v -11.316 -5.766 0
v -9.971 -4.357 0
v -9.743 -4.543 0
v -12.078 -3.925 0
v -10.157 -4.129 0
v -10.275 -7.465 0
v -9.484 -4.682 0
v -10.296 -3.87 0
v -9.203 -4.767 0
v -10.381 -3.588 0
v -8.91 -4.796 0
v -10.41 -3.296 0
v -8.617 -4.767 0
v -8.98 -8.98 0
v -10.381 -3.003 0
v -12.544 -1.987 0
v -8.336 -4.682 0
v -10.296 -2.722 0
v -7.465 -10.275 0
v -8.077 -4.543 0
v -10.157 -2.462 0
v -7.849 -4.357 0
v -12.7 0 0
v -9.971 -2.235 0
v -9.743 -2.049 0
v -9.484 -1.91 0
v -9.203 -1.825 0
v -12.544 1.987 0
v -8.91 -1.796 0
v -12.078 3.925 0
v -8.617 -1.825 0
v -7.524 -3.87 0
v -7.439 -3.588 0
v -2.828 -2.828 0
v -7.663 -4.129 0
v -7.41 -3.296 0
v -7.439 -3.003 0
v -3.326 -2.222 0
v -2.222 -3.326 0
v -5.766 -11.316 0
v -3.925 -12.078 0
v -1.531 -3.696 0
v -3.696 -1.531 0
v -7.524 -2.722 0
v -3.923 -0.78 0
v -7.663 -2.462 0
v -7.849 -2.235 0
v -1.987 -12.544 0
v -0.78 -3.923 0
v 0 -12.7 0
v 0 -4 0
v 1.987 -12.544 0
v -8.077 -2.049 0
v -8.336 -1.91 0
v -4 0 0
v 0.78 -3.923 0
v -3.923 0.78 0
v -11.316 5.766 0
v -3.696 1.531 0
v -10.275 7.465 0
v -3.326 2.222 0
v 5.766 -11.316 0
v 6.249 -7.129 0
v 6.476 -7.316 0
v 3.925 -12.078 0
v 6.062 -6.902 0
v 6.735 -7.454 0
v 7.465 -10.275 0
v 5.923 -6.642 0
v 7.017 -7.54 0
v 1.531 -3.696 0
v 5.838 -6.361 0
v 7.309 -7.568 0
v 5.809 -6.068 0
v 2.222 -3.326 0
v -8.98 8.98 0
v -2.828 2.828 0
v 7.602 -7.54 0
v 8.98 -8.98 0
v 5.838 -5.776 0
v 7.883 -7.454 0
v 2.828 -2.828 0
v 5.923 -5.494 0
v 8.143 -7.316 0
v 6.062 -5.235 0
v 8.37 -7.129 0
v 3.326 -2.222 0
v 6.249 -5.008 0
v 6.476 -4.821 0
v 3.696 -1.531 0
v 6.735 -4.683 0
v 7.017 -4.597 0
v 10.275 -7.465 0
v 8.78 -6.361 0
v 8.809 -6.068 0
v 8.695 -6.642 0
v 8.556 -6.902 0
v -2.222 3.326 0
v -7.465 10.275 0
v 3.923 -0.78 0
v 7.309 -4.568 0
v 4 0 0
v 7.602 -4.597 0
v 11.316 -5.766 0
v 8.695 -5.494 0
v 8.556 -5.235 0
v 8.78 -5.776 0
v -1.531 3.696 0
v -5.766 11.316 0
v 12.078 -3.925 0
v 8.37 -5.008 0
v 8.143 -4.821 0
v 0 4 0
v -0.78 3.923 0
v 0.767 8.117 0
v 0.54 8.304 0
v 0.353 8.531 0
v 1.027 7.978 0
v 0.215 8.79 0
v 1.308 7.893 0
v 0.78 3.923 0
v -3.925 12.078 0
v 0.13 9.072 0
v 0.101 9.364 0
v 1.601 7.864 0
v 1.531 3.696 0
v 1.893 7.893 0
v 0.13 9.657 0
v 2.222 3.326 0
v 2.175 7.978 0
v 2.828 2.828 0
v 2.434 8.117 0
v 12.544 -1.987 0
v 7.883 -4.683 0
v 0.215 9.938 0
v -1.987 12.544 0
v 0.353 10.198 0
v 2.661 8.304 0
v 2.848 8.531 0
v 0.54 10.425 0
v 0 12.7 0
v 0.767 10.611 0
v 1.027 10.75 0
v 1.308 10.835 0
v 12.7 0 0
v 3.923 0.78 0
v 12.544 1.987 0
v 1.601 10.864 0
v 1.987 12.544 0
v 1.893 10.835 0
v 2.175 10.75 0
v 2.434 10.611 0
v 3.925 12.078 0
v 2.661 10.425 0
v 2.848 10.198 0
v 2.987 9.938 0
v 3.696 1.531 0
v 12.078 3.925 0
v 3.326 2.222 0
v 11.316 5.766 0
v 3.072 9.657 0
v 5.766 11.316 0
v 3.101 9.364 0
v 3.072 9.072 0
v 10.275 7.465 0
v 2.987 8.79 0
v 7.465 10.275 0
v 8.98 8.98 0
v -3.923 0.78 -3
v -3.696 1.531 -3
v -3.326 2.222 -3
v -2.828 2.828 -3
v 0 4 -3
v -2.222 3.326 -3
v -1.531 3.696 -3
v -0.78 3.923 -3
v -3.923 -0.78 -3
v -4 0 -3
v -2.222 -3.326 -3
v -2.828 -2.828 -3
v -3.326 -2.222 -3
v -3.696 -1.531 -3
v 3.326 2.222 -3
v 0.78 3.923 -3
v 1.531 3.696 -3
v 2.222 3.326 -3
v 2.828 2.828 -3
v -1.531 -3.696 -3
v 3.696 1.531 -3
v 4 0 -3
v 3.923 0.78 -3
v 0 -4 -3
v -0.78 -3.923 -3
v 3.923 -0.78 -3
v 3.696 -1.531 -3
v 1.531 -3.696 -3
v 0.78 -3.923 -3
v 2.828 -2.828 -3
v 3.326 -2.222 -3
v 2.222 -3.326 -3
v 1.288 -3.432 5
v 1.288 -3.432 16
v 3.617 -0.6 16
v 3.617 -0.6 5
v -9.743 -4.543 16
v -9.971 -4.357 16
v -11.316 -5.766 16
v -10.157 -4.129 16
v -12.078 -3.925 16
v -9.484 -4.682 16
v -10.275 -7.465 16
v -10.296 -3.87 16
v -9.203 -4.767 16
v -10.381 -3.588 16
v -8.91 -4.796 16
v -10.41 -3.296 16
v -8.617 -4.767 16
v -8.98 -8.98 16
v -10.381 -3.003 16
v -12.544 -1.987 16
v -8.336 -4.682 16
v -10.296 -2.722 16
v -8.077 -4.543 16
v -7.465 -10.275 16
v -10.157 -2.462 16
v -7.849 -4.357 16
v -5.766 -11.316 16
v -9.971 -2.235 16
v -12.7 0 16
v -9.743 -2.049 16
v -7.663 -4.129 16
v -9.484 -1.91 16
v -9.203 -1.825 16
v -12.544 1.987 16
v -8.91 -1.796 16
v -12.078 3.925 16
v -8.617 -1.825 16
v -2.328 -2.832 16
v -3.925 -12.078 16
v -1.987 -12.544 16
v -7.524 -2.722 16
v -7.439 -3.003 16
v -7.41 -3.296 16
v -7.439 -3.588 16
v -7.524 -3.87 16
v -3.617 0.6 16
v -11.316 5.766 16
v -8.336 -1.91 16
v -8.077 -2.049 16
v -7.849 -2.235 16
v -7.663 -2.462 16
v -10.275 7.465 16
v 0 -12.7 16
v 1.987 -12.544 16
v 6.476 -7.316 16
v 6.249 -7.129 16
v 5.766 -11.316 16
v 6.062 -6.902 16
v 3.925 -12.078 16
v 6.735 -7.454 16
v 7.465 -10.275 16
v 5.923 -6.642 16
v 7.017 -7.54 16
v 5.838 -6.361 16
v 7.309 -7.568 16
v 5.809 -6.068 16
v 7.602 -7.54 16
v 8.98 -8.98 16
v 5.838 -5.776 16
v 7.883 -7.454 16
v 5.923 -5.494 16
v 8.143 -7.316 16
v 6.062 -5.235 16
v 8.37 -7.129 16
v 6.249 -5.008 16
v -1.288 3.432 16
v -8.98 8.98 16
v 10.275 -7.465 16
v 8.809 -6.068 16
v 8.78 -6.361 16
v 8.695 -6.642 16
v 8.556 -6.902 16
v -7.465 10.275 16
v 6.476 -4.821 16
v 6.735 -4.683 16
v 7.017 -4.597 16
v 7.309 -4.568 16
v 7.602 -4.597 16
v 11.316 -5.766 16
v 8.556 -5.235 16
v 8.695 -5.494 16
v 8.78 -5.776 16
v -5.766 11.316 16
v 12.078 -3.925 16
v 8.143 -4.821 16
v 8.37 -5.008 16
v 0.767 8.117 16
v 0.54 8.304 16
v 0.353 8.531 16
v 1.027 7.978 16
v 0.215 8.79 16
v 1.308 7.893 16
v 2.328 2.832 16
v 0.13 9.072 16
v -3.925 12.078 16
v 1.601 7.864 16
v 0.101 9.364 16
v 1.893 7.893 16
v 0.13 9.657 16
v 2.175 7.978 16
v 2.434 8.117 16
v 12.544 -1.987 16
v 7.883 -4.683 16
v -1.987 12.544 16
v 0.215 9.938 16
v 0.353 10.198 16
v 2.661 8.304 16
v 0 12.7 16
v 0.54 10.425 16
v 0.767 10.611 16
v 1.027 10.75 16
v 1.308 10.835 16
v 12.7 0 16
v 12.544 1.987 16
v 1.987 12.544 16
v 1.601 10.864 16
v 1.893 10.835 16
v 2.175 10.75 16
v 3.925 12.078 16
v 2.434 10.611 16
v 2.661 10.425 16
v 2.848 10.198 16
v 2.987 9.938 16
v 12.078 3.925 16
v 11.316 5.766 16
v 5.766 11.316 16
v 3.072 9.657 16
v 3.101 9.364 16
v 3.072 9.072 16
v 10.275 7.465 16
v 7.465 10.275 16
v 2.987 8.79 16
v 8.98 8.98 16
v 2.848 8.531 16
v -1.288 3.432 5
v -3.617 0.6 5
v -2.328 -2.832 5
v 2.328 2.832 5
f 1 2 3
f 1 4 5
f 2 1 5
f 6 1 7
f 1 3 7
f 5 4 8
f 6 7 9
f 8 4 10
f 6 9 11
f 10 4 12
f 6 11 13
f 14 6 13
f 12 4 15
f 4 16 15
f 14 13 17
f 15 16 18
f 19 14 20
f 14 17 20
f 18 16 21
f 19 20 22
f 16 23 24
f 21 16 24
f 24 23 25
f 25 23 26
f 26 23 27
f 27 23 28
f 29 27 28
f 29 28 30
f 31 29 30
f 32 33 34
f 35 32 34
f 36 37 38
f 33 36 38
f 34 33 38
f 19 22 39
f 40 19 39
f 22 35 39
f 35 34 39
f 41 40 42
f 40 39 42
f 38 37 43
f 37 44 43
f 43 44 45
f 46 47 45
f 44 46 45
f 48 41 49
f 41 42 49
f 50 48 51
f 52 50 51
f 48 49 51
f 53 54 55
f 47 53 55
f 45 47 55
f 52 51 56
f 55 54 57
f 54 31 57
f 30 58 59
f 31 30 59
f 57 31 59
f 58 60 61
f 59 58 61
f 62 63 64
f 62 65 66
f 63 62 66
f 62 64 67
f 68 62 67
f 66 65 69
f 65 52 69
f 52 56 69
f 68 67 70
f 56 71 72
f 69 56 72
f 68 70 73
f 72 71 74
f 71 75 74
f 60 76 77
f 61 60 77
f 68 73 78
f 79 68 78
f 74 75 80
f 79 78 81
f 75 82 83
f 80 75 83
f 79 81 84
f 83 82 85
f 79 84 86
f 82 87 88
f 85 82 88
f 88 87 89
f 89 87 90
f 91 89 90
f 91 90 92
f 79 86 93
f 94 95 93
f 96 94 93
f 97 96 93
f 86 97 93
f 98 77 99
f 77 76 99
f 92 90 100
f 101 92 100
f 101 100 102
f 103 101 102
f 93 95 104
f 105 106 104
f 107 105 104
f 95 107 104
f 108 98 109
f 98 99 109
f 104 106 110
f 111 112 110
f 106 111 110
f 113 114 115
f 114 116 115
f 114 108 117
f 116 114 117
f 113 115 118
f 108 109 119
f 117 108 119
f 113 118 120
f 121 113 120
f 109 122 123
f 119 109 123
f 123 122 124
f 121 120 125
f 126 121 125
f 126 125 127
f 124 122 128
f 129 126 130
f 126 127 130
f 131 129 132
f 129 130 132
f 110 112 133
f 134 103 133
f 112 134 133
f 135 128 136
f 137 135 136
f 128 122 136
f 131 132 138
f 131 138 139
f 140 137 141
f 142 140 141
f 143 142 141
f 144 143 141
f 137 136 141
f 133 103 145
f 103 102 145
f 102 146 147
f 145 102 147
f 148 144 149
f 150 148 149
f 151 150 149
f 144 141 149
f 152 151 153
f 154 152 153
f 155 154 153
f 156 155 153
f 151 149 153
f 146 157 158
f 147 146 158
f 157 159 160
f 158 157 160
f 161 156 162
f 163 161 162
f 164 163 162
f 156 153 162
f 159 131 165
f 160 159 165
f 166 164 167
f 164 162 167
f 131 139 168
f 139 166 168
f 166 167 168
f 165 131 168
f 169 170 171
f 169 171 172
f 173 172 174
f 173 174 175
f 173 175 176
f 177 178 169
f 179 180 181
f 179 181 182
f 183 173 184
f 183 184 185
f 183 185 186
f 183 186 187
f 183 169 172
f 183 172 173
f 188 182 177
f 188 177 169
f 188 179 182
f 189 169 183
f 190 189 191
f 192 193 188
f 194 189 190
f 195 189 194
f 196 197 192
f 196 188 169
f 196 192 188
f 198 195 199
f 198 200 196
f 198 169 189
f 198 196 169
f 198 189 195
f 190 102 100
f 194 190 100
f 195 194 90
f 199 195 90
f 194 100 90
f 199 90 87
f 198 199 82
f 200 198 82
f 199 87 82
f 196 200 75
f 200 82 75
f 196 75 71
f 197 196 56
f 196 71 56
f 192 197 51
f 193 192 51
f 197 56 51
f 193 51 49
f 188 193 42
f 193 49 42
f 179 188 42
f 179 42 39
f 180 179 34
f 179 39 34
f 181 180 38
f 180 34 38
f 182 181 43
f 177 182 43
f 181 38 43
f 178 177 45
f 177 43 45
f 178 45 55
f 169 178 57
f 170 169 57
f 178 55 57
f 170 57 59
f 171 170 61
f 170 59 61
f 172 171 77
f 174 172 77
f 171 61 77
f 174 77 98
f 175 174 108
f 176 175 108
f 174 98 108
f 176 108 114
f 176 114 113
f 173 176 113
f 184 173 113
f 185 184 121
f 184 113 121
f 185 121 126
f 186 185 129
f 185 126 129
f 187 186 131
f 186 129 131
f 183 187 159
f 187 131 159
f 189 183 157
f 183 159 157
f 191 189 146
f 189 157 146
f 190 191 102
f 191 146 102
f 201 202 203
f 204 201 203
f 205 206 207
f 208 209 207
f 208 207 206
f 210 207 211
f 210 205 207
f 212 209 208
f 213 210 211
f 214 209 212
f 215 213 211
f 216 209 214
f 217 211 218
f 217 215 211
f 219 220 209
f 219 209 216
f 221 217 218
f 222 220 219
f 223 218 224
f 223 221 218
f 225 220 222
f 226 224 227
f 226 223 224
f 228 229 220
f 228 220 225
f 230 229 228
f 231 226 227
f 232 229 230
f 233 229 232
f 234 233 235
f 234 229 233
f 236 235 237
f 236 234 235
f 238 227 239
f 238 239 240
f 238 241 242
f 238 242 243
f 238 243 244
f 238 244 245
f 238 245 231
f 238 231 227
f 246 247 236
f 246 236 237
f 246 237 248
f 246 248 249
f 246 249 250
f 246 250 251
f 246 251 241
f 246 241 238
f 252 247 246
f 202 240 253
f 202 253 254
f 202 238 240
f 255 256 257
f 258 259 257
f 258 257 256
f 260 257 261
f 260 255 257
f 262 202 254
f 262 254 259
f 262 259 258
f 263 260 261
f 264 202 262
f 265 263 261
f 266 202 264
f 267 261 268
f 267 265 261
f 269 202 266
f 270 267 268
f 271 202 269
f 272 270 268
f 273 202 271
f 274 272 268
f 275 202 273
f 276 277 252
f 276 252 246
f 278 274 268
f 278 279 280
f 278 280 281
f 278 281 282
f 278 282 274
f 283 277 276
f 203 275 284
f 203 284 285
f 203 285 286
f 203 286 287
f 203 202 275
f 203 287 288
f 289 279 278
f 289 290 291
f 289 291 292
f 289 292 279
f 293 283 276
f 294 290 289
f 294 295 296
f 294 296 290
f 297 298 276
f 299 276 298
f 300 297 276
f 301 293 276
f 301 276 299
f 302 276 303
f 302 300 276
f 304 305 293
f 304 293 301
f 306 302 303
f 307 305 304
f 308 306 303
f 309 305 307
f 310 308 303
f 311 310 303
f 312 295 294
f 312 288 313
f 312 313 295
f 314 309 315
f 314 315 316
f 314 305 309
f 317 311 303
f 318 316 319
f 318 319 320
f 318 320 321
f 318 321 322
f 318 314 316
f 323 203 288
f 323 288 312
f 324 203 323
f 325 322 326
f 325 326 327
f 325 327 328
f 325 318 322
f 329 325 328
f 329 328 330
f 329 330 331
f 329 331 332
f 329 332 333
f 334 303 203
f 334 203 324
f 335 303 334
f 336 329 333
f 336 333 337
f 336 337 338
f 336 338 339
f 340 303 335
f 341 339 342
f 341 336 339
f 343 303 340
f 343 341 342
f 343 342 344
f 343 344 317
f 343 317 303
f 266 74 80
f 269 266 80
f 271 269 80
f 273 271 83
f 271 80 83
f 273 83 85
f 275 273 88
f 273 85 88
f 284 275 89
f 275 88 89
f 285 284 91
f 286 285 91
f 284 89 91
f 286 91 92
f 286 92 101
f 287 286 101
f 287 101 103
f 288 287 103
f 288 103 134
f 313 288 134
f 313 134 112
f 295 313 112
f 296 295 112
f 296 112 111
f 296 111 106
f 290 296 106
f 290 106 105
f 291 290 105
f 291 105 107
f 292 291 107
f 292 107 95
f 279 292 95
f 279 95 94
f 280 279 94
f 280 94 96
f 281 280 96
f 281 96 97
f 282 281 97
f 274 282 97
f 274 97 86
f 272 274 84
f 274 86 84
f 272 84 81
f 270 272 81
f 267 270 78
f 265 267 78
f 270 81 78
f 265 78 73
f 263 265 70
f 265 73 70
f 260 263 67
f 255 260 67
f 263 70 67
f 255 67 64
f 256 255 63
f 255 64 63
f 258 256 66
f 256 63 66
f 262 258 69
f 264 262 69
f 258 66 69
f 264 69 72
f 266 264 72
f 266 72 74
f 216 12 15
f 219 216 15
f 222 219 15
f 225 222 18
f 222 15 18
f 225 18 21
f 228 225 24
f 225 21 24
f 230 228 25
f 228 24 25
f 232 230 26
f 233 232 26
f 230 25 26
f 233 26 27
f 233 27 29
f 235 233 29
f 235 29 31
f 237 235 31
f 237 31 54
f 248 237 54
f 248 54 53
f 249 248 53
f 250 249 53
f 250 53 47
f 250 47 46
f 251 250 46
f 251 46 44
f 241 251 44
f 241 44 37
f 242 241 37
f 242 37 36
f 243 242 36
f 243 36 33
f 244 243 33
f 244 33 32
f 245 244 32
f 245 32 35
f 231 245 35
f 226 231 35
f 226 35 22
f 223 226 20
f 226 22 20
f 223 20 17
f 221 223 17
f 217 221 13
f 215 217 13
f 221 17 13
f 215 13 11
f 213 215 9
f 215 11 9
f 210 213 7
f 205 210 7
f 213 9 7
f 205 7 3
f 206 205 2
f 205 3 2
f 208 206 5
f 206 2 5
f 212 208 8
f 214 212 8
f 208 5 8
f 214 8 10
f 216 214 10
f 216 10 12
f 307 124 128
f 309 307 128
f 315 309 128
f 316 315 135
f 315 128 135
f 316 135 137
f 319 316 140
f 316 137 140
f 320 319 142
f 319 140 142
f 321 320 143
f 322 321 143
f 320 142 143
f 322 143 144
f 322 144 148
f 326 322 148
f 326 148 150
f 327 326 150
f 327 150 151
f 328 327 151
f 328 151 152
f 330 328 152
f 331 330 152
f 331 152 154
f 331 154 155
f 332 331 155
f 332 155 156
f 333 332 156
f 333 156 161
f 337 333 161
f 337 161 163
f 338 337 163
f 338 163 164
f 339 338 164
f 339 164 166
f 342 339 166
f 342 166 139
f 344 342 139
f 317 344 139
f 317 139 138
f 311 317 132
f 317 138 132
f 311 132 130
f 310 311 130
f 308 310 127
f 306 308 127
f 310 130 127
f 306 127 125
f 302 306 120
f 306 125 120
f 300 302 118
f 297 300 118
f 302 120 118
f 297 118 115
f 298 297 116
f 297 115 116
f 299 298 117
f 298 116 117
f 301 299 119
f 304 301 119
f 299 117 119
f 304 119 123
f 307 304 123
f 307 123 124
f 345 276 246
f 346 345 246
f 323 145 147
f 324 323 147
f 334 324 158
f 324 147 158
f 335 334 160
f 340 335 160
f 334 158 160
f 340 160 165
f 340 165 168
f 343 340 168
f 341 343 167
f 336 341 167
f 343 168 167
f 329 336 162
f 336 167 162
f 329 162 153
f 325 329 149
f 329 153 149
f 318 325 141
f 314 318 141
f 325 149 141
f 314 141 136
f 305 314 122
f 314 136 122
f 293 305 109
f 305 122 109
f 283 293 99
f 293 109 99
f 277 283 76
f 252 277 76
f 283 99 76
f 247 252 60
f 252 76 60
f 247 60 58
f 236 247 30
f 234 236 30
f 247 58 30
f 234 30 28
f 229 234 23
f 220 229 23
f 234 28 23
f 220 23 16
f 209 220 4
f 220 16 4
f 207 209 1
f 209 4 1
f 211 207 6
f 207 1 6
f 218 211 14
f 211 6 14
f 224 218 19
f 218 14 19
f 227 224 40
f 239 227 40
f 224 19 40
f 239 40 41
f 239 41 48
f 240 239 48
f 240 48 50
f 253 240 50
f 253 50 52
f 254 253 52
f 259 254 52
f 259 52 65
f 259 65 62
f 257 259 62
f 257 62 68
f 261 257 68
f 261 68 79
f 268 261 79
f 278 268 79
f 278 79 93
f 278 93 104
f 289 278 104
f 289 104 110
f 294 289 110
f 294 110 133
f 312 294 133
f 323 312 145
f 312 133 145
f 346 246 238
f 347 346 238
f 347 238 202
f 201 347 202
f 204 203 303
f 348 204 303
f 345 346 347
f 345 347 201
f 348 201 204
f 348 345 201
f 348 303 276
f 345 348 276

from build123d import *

# Parameters (mm, degrees)
F0_R     = 12.7
F1_DEPTH = 16
F3_D     = 3
F5_DEPTH = 11
F6_R     = 4
F7_DEPTH = 3


with BuildPart() as f1:
    # F0 (on Top) → F1 (new body)
    with BuildSketch(Plane.XY):
        Circle(F0_R)
    extrude(amount=F1_DEPTH)

    # F3 (through all)
    with Locations(Plane.XY.offset(16)):
        with Locations((-8.909959, -3.295851), (1.600689, 9.364176), (7.30927, -6.068325)):
            Hole(F3_D / 2)

    # F4 (on face) → F5 (cut)
    with BuildSketch(Plane.XY.offset(16)):
        Polygon((3.616691, -0.600319), (2.328237, 2.831986), (-1.288454, 3.432305), (-3.616691, 0.600319), (-2.328237, -2.831986), (1.288454, -3.432305), align=None)
    extrude(amount=-F5_DEPTH, mode=Mode.SUBTRACT)

    # F6 (on face) → F7 (join)
    with BuildSketch(Plane(origin=(0, 0, 0), x_dir=(1, 0, 0), z_dir=(0, 0, -1))):
        Circle(F6_R)
    extrude(amount=F7_DEPTH)


solid = f1.part
